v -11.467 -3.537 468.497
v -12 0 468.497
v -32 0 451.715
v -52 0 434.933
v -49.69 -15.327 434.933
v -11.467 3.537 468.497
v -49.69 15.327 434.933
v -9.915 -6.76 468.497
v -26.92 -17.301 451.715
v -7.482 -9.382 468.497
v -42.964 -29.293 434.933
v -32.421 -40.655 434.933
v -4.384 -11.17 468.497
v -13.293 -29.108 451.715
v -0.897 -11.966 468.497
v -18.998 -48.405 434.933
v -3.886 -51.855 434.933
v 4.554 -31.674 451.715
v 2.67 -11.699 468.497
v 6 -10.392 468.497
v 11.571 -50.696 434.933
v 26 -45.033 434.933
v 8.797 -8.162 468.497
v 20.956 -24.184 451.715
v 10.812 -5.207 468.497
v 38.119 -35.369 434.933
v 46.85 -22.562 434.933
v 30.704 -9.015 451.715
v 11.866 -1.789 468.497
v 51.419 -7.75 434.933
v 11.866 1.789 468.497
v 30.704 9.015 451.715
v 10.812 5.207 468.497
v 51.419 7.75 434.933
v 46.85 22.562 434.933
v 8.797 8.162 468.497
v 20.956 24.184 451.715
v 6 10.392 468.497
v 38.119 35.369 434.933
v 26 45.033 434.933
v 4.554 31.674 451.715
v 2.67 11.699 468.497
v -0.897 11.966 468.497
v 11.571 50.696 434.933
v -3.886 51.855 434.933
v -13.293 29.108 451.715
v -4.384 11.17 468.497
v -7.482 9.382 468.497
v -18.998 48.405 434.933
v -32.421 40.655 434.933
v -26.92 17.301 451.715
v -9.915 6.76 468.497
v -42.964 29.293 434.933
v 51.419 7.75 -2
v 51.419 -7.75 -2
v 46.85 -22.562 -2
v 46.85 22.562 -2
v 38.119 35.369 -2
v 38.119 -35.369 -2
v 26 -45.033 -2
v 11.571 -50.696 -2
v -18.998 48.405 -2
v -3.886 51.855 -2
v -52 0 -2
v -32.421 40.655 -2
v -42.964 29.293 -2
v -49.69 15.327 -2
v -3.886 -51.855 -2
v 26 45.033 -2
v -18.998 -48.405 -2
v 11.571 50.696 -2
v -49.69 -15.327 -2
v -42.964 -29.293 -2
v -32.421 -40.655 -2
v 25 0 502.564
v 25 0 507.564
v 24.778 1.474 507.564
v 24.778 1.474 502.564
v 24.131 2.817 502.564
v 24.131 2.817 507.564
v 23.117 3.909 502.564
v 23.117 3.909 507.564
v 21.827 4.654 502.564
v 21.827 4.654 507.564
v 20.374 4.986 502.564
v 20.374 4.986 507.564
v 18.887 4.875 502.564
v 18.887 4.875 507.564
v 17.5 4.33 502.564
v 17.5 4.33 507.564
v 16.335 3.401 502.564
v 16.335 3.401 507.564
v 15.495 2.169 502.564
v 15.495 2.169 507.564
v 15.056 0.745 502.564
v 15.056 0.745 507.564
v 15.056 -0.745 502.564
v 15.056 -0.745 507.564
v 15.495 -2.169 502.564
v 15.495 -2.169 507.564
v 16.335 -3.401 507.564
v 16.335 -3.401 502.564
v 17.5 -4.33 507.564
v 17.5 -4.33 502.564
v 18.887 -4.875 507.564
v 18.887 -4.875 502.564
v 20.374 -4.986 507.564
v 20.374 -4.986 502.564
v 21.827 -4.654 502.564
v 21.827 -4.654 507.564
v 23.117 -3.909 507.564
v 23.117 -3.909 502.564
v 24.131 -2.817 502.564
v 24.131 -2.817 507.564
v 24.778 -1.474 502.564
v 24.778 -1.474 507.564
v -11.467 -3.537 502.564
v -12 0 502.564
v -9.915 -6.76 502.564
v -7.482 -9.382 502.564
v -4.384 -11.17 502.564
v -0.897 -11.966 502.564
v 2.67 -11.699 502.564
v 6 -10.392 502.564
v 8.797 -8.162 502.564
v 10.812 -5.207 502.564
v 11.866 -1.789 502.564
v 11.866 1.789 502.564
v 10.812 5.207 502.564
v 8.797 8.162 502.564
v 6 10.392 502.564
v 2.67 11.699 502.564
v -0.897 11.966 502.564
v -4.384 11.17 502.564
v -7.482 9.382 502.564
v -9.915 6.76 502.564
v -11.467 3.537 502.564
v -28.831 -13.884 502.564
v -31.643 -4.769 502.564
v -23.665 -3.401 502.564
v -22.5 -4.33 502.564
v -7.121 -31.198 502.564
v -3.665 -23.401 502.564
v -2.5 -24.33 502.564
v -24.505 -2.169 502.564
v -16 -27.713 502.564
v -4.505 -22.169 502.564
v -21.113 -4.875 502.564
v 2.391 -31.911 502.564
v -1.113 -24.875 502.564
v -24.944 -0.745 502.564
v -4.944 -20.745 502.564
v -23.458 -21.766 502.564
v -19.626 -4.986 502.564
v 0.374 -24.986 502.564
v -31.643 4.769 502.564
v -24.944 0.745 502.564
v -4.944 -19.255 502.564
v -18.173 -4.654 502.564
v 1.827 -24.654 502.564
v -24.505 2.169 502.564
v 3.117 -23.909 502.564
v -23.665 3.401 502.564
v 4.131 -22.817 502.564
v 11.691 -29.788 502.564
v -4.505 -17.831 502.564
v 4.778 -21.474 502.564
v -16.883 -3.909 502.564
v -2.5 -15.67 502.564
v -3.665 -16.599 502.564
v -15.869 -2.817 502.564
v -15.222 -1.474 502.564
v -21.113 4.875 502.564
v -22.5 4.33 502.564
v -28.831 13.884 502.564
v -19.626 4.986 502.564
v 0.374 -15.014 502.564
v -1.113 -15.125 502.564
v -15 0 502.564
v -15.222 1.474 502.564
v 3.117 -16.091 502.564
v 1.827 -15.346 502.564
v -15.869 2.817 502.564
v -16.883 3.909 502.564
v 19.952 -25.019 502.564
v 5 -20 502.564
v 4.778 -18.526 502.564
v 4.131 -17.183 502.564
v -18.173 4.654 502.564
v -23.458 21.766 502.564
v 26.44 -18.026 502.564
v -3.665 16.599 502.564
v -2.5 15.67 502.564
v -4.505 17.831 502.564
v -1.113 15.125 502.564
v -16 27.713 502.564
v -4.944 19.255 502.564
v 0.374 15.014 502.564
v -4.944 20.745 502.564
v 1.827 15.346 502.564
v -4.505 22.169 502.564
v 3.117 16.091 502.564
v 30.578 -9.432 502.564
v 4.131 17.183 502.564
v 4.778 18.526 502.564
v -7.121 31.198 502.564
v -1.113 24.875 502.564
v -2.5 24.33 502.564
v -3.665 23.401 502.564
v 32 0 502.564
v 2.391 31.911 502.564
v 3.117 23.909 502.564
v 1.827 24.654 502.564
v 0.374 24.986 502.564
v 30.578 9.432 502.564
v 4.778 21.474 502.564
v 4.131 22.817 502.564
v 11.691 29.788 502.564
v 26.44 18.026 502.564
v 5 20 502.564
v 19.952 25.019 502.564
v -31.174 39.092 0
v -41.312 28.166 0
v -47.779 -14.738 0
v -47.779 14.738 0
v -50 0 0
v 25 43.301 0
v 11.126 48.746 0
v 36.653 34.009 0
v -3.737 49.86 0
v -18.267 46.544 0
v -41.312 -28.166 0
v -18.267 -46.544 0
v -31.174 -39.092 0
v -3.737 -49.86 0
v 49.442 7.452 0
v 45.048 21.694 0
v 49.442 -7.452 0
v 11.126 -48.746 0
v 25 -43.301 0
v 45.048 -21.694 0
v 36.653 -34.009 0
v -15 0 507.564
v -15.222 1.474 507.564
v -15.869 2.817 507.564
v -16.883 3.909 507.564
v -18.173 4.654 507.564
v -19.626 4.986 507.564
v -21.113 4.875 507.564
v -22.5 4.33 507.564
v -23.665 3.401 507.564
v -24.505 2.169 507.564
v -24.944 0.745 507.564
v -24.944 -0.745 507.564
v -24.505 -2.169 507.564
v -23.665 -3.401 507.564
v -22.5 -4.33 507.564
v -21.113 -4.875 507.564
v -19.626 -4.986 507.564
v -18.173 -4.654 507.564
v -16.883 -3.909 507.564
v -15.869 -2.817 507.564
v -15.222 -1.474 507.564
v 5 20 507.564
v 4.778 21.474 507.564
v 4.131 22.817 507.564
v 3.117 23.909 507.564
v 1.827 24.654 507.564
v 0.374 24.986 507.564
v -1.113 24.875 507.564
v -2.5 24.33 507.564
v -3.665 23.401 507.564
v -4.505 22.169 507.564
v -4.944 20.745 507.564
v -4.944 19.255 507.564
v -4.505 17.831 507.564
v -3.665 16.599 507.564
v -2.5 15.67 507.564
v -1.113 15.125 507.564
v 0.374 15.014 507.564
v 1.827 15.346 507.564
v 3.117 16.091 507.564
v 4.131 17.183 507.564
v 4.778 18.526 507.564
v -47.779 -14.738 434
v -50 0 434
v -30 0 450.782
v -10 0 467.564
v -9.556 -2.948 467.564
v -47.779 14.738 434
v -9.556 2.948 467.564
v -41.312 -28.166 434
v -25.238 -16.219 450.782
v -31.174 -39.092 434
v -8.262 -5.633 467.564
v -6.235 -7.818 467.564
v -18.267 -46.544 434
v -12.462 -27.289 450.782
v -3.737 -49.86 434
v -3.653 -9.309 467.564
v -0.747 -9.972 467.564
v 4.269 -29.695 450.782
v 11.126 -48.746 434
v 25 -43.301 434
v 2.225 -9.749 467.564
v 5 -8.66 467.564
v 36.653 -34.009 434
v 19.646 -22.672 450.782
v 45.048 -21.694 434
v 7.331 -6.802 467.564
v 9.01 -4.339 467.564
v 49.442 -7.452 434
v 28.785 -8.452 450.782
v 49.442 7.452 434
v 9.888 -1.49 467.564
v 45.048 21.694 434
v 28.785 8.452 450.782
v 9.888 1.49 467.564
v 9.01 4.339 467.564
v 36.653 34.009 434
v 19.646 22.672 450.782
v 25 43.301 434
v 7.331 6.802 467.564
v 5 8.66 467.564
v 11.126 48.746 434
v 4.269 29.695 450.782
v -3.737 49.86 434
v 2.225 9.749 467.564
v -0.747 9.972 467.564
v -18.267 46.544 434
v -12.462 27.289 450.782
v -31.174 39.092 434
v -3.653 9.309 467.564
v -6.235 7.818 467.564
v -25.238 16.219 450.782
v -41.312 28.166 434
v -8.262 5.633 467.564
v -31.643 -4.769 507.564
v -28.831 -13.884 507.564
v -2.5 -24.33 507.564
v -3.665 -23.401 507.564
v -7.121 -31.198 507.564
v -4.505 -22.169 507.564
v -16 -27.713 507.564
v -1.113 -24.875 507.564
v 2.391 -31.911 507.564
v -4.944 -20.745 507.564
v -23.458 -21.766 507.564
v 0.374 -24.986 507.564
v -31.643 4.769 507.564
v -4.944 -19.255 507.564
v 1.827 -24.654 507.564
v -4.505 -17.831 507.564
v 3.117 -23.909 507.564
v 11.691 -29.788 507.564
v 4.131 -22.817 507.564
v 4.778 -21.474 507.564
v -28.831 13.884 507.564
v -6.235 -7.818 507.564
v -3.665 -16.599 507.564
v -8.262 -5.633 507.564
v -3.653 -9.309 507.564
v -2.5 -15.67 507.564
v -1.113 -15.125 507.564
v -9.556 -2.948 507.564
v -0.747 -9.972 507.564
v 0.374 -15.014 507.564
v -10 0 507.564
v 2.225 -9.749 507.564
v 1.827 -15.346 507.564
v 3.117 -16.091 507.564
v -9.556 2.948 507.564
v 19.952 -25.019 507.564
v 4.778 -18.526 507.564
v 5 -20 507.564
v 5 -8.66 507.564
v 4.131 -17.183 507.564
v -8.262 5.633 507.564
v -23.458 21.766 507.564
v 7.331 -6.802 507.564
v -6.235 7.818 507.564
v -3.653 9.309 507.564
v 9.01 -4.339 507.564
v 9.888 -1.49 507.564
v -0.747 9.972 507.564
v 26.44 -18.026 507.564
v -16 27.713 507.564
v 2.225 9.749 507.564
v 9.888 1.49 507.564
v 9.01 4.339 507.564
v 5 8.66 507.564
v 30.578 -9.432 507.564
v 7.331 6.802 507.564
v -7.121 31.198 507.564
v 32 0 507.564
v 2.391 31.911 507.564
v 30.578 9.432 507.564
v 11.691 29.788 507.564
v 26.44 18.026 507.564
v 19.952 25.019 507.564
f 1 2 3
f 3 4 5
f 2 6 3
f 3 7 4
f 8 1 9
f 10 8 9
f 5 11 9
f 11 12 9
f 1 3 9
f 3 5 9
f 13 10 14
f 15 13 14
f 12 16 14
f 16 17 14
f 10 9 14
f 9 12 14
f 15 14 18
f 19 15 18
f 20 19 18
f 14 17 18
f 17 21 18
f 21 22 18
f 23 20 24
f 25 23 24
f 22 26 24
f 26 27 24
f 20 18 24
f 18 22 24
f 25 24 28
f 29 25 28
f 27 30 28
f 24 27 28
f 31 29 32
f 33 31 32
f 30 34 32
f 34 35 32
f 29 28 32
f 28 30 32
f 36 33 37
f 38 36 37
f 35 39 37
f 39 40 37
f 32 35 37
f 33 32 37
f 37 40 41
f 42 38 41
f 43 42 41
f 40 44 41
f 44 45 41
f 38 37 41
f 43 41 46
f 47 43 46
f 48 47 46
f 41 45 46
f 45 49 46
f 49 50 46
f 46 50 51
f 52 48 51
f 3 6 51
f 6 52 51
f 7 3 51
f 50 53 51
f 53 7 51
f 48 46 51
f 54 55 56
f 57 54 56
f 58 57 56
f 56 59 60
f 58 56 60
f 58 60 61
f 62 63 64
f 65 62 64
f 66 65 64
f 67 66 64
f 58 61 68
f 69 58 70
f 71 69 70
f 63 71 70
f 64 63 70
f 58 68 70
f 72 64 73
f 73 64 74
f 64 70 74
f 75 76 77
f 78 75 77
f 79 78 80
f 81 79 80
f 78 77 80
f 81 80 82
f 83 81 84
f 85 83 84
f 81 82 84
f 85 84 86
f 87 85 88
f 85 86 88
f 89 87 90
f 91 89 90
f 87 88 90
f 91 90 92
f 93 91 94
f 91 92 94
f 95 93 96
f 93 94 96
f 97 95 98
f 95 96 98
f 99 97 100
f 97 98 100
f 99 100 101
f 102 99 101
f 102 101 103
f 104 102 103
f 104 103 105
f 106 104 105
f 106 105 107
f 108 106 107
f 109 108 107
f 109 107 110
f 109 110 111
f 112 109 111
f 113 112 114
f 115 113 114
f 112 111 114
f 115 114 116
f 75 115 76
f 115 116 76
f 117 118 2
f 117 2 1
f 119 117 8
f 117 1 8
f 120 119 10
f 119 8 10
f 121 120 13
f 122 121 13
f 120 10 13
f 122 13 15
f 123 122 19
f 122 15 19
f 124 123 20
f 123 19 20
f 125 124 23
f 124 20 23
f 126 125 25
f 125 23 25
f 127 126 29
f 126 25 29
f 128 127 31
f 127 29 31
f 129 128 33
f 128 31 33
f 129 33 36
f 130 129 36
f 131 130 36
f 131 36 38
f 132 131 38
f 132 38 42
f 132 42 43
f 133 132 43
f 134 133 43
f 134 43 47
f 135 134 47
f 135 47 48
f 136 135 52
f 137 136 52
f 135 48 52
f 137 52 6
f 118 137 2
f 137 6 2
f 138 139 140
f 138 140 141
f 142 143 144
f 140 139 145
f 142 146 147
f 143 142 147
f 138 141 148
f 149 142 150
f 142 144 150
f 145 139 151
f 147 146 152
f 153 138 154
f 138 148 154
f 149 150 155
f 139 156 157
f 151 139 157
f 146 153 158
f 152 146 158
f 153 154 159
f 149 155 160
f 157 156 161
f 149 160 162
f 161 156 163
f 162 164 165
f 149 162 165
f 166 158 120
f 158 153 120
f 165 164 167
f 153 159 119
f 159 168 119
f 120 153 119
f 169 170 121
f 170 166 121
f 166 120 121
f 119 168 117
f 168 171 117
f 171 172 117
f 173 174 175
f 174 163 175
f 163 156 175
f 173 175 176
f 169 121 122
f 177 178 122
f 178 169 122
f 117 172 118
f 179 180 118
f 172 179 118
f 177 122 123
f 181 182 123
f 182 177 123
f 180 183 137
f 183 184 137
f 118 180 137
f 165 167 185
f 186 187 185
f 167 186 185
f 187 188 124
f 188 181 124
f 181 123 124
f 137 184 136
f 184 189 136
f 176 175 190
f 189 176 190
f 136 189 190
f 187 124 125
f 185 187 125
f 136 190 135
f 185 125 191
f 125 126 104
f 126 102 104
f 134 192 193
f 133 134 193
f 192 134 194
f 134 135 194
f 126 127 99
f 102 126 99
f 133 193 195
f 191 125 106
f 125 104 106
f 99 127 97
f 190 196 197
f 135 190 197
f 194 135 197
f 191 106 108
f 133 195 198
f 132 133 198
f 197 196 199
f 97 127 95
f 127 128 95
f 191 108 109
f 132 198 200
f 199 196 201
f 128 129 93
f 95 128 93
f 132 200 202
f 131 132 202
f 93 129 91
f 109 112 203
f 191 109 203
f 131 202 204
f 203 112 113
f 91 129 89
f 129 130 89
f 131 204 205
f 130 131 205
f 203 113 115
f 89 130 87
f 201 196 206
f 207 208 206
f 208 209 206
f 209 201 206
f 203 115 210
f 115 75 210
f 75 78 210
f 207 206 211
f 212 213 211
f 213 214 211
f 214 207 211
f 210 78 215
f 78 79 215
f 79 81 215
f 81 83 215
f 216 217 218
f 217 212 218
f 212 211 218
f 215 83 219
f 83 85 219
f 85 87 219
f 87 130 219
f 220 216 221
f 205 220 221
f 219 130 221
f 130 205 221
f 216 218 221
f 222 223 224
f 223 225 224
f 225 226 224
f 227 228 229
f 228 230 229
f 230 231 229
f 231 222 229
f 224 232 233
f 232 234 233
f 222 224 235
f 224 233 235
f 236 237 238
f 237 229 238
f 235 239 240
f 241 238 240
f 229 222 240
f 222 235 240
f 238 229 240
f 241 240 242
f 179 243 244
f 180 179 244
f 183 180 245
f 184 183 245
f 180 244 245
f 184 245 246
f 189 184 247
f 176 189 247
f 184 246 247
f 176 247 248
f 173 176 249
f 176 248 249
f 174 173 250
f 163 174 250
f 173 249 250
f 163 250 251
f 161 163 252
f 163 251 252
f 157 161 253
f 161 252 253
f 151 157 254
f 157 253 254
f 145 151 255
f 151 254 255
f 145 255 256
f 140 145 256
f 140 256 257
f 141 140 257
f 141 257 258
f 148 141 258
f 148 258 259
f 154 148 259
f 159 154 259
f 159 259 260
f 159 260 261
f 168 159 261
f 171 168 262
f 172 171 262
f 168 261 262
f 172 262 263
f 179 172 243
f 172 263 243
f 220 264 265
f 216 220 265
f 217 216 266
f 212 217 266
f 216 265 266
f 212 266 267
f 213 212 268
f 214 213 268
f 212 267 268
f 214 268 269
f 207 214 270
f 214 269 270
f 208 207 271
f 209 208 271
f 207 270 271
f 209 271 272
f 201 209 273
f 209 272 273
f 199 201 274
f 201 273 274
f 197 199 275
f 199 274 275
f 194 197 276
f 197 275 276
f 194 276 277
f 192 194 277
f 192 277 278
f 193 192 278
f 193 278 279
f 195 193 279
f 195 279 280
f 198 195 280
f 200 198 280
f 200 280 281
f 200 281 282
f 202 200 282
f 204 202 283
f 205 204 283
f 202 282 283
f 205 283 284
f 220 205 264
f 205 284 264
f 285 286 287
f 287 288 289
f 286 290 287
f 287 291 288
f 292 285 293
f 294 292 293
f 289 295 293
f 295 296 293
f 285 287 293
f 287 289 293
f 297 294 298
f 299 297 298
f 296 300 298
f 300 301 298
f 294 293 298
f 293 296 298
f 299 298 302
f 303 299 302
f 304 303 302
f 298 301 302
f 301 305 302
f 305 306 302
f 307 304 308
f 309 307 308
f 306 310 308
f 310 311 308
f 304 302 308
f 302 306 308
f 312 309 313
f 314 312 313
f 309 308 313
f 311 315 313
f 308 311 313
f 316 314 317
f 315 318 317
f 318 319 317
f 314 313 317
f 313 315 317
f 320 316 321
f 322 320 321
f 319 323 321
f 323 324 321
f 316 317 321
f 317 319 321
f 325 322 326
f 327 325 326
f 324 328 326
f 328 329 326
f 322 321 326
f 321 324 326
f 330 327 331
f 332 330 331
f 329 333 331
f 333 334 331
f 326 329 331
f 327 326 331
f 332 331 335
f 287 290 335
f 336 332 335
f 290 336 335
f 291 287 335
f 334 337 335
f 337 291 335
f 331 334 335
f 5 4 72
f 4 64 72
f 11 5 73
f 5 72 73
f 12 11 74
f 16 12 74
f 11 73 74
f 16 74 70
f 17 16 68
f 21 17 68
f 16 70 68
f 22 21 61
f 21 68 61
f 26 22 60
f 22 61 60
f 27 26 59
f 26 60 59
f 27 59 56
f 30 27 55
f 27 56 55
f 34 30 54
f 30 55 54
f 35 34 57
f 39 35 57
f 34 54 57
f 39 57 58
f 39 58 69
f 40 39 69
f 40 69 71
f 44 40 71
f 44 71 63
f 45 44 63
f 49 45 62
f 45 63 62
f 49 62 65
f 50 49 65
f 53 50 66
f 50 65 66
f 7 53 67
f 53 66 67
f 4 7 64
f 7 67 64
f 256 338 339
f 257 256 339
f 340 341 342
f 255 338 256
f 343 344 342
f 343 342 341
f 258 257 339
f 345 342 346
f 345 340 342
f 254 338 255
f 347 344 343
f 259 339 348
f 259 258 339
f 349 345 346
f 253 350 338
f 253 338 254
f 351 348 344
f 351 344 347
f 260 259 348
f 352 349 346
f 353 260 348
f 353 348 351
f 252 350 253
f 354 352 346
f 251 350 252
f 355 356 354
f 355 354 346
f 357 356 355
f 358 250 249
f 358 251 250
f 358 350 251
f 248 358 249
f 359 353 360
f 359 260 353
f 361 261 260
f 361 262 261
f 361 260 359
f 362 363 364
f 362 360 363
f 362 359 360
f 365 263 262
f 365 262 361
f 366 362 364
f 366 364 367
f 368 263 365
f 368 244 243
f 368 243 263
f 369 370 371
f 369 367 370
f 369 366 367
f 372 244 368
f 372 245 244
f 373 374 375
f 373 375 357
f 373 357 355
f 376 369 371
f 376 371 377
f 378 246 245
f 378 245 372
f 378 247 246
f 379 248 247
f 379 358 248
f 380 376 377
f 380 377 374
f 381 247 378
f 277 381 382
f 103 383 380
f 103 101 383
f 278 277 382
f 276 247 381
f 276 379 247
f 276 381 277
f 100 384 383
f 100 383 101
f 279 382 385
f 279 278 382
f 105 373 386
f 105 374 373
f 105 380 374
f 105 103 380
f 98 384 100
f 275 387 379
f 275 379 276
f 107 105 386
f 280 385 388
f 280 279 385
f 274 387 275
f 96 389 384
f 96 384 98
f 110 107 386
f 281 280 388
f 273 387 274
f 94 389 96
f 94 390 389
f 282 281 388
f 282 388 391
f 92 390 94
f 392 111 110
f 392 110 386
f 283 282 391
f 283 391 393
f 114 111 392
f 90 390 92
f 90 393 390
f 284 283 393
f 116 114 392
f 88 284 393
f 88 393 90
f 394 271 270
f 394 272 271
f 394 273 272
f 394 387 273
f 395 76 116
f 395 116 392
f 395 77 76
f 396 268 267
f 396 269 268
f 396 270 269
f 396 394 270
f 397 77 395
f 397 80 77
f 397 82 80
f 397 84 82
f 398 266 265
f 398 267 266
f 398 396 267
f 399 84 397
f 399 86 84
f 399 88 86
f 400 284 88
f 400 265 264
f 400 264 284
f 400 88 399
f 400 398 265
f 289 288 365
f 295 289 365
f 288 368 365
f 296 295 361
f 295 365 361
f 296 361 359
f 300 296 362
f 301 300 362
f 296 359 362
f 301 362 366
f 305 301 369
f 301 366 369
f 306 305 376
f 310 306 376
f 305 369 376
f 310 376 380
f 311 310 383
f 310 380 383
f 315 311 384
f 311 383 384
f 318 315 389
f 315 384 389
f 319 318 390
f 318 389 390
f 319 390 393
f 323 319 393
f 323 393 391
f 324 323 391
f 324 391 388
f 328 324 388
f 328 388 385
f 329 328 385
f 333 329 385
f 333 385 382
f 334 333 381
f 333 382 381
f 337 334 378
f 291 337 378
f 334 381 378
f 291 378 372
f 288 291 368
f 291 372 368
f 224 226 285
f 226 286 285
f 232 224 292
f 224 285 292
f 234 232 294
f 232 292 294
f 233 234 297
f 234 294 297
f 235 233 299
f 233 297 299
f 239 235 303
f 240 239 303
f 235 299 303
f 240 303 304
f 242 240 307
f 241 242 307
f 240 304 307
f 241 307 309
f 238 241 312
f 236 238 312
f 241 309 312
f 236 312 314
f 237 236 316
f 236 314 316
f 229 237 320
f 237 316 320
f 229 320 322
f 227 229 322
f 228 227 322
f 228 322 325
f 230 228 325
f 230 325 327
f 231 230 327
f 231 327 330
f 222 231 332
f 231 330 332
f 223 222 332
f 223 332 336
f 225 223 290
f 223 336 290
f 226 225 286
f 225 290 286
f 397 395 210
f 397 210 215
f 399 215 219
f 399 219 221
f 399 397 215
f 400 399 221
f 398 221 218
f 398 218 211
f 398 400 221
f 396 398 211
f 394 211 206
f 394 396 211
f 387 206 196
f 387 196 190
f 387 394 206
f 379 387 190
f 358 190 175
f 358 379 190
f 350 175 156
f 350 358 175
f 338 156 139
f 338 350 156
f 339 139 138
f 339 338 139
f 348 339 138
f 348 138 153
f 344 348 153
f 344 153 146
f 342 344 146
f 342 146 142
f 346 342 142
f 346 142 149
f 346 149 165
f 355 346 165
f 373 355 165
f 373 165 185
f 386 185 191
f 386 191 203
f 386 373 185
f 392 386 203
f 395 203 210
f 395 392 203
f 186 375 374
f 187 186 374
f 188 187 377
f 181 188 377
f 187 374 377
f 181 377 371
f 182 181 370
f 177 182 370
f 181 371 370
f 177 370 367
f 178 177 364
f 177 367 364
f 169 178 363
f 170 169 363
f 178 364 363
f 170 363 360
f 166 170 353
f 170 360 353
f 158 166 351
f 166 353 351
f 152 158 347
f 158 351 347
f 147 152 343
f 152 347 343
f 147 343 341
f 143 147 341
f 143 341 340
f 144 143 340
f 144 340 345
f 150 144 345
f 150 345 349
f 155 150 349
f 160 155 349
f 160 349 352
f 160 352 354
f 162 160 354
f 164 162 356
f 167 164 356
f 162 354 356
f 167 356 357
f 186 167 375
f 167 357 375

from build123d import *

# Parameters (mm, degrees)
F2_R     = 32
F2_R_2   = 12
F3_DEPTH = 5
F4_R     = 5
F5_DEPTH = 5


with BuildPart() as f1:
    # F0 (on Front) → F1 (revolve)
    with BuildSketch(Plane.XZ):
        Polygon((-50, 0), (-50, 434), (-10, 467.5639852471), (-10, 507.5639852471), (-12, 507.5639852471), (-12, 468.4966005634), (-52, 434.9326153163), (-52, -2), (0, -2), (0, 0), align=None)
    revolve(axis=Axis((0, 0, 216.0225092206), (0, 0, 1)))

    # F2 (on face) → F3 (join)
    with BuildSketch(Plane.XY.offset(507.5639852471)):
        Circle(F2_R)
        Circle(F2_R_2, mode=Mode.SUBTRACT)
    extrude(amount=-F3_DEPTH)

    # F4 (on face) → F5 (cut, through all)
    with BuildSketch(Plane.XY.offset(507.5639852471)):
        with Locations((0, 20)):
            Circle(F4_R)
        with Locations((-20, 0)):
            Circle(F4_R)
        with Locations((0, -20)):
            Circle(F4_R)
        with Locations((20, 0)):
            Circle(F4_R)
    extrude(amount=-F5_DEPTH, mode=Mode.SUBTRACT)


solid = f1.part
